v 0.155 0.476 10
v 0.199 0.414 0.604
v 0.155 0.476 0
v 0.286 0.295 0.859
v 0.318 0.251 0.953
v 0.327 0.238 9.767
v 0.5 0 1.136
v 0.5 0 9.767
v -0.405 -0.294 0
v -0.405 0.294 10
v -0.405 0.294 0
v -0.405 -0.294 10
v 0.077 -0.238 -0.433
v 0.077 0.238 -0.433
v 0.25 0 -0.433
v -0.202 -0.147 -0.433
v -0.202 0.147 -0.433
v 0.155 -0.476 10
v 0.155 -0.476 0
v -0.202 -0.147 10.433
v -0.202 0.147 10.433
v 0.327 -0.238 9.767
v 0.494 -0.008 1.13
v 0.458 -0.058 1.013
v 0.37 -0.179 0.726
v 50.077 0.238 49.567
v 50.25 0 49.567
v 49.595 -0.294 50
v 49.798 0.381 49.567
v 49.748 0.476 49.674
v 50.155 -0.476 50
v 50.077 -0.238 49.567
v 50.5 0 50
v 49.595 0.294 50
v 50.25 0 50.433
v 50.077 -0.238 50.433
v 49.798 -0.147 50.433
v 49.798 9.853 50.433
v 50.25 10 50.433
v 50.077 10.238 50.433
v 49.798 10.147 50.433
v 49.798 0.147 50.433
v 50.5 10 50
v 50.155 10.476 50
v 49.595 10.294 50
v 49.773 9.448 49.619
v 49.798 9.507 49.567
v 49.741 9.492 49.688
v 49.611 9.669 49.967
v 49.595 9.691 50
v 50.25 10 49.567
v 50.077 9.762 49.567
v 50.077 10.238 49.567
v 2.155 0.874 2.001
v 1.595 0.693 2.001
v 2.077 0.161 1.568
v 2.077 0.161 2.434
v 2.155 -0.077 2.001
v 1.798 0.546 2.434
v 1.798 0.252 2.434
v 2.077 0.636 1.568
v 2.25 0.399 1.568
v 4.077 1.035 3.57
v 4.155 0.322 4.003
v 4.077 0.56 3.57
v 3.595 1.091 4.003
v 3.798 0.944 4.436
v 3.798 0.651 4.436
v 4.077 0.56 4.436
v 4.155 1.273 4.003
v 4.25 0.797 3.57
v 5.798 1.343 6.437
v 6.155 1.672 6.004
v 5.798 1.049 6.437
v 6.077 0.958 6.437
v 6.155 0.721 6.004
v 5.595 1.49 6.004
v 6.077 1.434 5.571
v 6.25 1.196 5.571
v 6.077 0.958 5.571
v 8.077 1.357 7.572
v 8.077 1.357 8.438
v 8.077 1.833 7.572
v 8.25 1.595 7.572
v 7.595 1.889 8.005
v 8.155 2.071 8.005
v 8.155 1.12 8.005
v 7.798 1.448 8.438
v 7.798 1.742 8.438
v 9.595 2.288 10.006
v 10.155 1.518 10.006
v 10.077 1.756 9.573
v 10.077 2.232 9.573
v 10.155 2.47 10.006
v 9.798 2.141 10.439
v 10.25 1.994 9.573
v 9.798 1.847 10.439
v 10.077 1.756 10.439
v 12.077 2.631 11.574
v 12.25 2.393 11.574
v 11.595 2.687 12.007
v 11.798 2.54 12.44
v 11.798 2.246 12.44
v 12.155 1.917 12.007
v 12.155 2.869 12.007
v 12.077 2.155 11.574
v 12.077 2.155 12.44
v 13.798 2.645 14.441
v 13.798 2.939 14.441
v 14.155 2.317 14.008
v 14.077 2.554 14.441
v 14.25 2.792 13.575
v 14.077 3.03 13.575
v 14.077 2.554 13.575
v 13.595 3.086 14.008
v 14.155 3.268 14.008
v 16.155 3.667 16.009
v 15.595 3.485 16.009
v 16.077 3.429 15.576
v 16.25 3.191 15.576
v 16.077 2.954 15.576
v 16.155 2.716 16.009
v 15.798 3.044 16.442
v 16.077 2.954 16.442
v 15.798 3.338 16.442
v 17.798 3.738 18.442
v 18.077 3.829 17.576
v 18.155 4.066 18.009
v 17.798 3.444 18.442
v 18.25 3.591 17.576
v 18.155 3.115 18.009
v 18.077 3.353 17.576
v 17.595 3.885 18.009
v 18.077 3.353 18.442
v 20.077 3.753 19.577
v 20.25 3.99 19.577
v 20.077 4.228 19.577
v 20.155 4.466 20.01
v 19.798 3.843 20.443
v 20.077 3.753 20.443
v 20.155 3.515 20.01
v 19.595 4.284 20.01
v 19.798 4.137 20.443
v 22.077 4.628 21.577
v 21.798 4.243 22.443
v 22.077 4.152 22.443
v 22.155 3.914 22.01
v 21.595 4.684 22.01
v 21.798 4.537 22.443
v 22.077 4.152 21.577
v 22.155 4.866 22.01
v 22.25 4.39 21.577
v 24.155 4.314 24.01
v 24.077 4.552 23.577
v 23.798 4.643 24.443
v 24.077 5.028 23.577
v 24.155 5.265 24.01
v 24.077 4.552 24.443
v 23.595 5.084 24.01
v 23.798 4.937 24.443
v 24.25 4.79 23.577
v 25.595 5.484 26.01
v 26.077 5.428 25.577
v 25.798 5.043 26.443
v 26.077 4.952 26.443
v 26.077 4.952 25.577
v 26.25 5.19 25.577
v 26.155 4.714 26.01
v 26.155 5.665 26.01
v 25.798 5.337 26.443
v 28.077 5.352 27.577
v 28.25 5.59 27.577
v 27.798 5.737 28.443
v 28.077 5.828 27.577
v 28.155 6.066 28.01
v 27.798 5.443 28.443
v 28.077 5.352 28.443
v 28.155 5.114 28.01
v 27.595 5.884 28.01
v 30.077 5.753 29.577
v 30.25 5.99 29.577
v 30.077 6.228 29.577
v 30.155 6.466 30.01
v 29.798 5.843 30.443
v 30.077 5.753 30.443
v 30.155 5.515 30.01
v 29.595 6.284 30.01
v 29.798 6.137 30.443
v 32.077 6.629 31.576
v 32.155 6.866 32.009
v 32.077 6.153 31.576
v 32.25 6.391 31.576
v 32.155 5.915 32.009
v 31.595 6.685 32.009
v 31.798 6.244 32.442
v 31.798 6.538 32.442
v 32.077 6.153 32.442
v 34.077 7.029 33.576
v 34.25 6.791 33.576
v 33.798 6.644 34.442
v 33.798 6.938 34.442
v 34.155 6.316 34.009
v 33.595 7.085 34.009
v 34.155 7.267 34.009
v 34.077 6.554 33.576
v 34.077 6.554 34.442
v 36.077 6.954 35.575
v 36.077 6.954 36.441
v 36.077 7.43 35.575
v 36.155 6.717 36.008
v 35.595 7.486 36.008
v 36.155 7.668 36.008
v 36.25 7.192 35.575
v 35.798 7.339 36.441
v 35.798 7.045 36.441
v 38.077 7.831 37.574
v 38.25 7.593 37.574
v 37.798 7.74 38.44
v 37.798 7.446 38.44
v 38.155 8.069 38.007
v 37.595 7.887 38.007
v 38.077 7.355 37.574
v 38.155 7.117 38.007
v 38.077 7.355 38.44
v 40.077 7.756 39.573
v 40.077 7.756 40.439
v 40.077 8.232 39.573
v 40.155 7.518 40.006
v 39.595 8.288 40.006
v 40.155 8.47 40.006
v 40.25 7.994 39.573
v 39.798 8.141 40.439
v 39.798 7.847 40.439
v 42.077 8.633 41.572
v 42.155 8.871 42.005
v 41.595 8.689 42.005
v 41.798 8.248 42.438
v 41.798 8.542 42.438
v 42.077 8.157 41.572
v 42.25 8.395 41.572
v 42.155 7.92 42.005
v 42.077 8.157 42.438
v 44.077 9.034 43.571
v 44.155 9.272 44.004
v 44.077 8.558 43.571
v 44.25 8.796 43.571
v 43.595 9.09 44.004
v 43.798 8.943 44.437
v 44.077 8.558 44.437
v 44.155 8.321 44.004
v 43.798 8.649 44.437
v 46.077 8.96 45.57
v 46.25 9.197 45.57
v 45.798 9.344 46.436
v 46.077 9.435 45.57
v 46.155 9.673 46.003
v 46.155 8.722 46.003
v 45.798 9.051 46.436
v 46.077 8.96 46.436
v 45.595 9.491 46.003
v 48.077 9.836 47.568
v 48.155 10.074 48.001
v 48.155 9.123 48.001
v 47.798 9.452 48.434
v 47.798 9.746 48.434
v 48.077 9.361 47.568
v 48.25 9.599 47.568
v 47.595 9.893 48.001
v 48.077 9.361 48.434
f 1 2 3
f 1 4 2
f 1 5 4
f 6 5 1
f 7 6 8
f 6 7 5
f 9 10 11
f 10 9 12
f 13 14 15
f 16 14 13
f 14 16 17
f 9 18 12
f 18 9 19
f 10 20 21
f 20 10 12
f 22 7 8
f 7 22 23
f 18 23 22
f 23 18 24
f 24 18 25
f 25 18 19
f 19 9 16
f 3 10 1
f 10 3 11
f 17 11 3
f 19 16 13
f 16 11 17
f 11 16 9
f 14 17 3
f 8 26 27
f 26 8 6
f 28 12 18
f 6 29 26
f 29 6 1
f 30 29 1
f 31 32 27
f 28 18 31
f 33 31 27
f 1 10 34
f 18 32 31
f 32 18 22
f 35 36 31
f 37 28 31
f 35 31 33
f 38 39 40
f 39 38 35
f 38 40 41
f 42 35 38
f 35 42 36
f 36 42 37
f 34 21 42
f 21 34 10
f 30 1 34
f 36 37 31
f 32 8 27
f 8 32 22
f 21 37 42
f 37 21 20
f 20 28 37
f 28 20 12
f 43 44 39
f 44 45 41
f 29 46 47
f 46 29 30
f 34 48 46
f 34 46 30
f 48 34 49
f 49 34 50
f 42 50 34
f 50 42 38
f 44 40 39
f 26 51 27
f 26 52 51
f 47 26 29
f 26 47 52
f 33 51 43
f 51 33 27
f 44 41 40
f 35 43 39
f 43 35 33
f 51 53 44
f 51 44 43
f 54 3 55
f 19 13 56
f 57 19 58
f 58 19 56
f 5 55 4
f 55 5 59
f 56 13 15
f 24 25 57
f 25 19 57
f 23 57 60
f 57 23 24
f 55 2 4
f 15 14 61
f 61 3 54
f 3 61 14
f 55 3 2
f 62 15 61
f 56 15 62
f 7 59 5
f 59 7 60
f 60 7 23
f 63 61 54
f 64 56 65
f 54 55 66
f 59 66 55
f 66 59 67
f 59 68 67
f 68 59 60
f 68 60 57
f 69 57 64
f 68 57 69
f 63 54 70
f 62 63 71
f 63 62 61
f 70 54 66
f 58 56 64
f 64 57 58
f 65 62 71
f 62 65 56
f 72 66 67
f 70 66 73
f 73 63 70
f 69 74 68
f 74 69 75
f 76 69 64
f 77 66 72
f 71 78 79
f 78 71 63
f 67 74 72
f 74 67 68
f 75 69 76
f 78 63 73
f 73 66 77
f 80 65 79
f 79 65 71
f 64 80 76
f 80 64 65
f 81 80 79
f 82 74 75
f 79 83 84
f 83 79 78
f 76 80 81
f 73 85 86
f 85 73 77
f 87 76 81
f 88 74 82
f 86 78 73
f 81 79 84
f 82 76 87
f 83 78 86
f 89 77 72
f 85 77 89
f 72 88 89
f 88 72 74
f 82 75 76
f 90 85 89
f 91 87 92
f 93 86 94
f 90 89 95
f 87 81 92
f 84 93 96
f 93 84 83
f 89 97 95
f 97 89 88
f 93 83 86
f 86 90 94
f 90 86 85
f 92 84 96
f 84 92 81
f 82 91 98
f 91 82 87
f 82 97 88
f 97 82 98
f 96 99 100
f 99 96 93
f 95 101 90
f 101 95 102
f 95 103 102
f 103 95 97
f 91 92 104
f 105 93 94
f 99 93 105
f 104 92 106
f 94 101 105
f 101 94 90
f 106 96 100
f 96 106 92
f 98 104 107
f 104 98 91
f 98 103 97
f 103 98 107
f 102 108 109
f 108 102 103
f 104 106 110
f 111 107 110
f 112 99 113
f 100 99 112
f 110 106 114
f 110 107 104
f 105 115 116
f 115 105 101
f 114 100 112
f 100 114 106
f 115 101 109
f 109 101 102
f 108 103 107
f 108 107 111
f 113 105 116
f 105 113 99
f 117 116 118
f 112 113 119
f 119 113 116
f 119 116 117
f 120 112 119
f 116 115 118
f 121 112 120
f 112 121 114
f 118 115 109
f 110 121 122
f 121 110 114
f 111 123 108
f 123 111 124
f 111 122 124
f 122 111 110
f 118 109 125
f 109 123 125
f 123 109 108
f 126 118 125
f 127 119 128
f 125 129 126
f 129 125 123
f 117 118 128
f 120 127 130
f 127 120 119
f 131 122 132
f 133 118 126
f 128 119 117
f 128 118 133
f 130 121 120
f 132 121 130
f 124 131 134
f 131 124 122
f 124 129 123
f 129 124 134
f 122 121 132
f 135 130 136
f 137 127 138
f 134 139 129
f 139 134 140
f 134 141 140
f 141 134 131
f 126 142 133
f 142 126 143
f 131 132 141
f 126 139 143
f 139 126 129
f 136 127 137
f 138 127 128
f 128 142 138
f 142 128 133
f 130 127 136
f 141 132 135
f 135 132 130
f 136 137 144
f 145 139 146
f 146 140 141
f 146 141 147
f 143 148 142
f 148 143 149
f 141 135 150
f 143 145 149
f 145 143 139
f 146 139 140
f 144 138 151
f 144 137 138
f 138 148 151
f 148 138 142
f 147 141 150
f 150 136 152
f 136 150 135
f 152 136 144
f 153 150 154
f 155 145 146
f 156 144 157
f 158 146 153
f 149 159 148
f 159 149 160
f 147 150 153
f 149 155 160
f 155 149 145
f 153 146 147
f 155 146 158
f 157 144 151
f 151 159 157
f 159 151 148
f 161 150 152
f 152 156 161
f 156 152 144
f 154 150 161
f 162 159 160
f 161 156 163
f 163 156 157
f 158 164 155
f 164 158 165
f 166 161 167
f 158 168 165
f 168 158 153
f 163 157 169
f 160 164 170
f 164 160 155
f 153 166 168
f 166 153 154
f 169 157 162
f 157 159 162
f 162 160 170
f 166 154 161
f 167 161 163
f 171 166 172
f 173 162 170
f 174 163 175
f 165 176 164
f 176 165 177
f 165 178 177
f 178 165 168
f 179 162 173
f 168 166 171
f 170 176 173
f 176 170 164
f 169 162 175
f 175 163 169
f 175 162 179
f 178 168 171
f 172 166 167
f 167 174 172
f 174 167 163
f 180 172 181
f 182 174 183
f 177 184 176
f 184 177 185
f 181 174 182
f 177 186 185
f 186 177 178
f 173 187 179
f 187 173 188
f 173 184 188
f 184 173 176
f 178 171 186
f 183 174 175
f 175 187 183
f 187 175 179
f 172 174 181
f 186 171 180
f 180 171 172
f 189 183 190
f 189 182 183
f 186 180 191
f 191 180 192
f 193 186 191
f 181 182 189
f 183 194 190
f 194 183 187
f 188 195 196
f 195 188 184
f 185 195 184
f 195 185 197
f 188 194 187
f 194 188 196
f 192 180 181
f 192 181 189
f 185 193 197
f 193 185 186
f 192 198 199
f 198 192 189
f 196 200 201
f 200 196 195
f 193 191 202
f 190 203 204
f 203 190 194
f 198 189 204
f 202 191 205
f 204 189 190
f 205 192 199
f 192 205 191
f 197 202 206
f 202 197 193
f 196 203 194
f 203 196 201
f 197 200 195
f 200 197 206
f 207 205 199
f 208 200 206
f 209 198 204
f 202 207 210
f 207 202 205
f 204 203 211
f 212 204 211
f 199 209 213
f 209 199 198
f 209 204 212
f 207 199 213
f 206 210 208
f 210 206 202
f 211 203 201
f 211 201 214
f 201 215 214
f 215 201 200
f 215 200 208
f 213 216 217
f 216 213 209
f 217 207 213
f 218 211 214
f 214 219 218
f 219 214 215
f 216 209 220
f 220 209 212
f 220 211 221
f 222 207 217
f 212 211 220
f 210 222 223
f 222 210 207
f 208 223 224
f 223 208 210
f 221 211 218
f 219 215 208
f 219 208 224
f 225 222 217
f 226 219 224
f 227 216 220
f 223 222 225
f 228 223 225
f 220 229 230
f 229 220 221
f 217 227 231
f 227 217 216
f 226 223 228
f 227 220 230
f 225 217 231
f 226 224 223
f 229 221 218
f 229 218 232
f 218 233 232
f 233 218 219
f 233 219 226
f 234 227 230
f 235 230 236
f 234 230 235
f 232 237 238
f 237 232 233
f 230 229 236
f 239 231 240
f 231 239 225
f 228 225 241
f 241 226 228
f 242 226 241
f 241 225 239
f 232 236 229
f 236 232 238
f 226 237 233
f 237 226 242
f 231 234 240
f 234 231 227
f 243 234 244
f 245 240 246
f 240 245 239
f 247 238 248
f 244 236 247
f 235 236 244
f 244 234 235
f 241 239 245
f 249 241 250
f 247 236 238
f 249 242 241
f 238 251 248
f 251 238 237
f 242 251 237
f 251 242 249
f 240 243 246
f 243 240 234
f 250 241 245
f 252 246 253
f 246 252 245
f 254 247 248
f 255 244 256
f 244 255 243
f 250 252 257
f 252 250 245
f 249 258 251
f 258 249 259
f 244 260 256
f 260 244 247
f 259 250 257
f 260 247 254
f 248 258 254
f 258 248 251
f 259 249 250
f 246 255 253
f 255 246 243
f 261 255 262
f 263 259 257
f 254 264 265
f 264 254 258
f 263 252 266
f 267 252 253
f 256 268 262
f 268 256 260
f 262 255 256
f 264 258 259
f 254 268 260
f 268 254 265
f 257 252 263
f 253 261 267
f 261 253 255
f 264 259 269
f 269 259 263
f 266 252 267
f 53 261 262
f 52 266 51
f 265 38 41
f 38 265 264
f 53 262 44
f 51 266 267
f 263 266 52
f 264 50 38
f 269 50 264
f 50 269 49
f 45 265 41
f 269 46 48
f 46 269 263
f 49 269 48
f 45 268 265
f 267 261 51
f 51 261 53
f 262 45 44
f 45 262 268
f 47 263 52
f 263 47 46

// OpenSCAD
constrain=[[0, 0, 0], [0, 0, 10], [50, 0, 50], [50, 10, 50]];
lenght=100;
links=25;
chain=concat(
[constrain[0]],[constrain[1]],[for(i=[0:max(1,links-4)])(constrain[1]+constrain[2])/2],[constrain[2]],[constrain[3]]);
function smooth(vi,t)=
let(v=t>0?smooth(vi,t-1):vi)
let(e=len(v)-1,sm=[ 

for (i=[1:max(1,e-1)])(v[i]+v[clamp(i-1,0,e)]+v[clamp(i+1,0,e)])/3

])
concat([v[0]],sm,[v[len(v)-1]]);



function clamp(a, b = 0, c = 1) = min(max(a, b), c);
function un (v)=v/max(norm(v),1e-32);// div by zero safe


module ShowControl(v) { // translate(t(v[0])) sphere(v[0][3]);
 
    for (i = [1: len(v) - 1]) {
      // vg  translate(t(v[i])) sphere(v[i][3]);
      hull() {
        translate( v[i]) sphere(0.5);
        translate( v[i - 1]) sphere(0.5);
      }
    }
}


ShowControl(constrain);
ShowControl(smooth(chain,1220));
 echo(smooth(chain));
